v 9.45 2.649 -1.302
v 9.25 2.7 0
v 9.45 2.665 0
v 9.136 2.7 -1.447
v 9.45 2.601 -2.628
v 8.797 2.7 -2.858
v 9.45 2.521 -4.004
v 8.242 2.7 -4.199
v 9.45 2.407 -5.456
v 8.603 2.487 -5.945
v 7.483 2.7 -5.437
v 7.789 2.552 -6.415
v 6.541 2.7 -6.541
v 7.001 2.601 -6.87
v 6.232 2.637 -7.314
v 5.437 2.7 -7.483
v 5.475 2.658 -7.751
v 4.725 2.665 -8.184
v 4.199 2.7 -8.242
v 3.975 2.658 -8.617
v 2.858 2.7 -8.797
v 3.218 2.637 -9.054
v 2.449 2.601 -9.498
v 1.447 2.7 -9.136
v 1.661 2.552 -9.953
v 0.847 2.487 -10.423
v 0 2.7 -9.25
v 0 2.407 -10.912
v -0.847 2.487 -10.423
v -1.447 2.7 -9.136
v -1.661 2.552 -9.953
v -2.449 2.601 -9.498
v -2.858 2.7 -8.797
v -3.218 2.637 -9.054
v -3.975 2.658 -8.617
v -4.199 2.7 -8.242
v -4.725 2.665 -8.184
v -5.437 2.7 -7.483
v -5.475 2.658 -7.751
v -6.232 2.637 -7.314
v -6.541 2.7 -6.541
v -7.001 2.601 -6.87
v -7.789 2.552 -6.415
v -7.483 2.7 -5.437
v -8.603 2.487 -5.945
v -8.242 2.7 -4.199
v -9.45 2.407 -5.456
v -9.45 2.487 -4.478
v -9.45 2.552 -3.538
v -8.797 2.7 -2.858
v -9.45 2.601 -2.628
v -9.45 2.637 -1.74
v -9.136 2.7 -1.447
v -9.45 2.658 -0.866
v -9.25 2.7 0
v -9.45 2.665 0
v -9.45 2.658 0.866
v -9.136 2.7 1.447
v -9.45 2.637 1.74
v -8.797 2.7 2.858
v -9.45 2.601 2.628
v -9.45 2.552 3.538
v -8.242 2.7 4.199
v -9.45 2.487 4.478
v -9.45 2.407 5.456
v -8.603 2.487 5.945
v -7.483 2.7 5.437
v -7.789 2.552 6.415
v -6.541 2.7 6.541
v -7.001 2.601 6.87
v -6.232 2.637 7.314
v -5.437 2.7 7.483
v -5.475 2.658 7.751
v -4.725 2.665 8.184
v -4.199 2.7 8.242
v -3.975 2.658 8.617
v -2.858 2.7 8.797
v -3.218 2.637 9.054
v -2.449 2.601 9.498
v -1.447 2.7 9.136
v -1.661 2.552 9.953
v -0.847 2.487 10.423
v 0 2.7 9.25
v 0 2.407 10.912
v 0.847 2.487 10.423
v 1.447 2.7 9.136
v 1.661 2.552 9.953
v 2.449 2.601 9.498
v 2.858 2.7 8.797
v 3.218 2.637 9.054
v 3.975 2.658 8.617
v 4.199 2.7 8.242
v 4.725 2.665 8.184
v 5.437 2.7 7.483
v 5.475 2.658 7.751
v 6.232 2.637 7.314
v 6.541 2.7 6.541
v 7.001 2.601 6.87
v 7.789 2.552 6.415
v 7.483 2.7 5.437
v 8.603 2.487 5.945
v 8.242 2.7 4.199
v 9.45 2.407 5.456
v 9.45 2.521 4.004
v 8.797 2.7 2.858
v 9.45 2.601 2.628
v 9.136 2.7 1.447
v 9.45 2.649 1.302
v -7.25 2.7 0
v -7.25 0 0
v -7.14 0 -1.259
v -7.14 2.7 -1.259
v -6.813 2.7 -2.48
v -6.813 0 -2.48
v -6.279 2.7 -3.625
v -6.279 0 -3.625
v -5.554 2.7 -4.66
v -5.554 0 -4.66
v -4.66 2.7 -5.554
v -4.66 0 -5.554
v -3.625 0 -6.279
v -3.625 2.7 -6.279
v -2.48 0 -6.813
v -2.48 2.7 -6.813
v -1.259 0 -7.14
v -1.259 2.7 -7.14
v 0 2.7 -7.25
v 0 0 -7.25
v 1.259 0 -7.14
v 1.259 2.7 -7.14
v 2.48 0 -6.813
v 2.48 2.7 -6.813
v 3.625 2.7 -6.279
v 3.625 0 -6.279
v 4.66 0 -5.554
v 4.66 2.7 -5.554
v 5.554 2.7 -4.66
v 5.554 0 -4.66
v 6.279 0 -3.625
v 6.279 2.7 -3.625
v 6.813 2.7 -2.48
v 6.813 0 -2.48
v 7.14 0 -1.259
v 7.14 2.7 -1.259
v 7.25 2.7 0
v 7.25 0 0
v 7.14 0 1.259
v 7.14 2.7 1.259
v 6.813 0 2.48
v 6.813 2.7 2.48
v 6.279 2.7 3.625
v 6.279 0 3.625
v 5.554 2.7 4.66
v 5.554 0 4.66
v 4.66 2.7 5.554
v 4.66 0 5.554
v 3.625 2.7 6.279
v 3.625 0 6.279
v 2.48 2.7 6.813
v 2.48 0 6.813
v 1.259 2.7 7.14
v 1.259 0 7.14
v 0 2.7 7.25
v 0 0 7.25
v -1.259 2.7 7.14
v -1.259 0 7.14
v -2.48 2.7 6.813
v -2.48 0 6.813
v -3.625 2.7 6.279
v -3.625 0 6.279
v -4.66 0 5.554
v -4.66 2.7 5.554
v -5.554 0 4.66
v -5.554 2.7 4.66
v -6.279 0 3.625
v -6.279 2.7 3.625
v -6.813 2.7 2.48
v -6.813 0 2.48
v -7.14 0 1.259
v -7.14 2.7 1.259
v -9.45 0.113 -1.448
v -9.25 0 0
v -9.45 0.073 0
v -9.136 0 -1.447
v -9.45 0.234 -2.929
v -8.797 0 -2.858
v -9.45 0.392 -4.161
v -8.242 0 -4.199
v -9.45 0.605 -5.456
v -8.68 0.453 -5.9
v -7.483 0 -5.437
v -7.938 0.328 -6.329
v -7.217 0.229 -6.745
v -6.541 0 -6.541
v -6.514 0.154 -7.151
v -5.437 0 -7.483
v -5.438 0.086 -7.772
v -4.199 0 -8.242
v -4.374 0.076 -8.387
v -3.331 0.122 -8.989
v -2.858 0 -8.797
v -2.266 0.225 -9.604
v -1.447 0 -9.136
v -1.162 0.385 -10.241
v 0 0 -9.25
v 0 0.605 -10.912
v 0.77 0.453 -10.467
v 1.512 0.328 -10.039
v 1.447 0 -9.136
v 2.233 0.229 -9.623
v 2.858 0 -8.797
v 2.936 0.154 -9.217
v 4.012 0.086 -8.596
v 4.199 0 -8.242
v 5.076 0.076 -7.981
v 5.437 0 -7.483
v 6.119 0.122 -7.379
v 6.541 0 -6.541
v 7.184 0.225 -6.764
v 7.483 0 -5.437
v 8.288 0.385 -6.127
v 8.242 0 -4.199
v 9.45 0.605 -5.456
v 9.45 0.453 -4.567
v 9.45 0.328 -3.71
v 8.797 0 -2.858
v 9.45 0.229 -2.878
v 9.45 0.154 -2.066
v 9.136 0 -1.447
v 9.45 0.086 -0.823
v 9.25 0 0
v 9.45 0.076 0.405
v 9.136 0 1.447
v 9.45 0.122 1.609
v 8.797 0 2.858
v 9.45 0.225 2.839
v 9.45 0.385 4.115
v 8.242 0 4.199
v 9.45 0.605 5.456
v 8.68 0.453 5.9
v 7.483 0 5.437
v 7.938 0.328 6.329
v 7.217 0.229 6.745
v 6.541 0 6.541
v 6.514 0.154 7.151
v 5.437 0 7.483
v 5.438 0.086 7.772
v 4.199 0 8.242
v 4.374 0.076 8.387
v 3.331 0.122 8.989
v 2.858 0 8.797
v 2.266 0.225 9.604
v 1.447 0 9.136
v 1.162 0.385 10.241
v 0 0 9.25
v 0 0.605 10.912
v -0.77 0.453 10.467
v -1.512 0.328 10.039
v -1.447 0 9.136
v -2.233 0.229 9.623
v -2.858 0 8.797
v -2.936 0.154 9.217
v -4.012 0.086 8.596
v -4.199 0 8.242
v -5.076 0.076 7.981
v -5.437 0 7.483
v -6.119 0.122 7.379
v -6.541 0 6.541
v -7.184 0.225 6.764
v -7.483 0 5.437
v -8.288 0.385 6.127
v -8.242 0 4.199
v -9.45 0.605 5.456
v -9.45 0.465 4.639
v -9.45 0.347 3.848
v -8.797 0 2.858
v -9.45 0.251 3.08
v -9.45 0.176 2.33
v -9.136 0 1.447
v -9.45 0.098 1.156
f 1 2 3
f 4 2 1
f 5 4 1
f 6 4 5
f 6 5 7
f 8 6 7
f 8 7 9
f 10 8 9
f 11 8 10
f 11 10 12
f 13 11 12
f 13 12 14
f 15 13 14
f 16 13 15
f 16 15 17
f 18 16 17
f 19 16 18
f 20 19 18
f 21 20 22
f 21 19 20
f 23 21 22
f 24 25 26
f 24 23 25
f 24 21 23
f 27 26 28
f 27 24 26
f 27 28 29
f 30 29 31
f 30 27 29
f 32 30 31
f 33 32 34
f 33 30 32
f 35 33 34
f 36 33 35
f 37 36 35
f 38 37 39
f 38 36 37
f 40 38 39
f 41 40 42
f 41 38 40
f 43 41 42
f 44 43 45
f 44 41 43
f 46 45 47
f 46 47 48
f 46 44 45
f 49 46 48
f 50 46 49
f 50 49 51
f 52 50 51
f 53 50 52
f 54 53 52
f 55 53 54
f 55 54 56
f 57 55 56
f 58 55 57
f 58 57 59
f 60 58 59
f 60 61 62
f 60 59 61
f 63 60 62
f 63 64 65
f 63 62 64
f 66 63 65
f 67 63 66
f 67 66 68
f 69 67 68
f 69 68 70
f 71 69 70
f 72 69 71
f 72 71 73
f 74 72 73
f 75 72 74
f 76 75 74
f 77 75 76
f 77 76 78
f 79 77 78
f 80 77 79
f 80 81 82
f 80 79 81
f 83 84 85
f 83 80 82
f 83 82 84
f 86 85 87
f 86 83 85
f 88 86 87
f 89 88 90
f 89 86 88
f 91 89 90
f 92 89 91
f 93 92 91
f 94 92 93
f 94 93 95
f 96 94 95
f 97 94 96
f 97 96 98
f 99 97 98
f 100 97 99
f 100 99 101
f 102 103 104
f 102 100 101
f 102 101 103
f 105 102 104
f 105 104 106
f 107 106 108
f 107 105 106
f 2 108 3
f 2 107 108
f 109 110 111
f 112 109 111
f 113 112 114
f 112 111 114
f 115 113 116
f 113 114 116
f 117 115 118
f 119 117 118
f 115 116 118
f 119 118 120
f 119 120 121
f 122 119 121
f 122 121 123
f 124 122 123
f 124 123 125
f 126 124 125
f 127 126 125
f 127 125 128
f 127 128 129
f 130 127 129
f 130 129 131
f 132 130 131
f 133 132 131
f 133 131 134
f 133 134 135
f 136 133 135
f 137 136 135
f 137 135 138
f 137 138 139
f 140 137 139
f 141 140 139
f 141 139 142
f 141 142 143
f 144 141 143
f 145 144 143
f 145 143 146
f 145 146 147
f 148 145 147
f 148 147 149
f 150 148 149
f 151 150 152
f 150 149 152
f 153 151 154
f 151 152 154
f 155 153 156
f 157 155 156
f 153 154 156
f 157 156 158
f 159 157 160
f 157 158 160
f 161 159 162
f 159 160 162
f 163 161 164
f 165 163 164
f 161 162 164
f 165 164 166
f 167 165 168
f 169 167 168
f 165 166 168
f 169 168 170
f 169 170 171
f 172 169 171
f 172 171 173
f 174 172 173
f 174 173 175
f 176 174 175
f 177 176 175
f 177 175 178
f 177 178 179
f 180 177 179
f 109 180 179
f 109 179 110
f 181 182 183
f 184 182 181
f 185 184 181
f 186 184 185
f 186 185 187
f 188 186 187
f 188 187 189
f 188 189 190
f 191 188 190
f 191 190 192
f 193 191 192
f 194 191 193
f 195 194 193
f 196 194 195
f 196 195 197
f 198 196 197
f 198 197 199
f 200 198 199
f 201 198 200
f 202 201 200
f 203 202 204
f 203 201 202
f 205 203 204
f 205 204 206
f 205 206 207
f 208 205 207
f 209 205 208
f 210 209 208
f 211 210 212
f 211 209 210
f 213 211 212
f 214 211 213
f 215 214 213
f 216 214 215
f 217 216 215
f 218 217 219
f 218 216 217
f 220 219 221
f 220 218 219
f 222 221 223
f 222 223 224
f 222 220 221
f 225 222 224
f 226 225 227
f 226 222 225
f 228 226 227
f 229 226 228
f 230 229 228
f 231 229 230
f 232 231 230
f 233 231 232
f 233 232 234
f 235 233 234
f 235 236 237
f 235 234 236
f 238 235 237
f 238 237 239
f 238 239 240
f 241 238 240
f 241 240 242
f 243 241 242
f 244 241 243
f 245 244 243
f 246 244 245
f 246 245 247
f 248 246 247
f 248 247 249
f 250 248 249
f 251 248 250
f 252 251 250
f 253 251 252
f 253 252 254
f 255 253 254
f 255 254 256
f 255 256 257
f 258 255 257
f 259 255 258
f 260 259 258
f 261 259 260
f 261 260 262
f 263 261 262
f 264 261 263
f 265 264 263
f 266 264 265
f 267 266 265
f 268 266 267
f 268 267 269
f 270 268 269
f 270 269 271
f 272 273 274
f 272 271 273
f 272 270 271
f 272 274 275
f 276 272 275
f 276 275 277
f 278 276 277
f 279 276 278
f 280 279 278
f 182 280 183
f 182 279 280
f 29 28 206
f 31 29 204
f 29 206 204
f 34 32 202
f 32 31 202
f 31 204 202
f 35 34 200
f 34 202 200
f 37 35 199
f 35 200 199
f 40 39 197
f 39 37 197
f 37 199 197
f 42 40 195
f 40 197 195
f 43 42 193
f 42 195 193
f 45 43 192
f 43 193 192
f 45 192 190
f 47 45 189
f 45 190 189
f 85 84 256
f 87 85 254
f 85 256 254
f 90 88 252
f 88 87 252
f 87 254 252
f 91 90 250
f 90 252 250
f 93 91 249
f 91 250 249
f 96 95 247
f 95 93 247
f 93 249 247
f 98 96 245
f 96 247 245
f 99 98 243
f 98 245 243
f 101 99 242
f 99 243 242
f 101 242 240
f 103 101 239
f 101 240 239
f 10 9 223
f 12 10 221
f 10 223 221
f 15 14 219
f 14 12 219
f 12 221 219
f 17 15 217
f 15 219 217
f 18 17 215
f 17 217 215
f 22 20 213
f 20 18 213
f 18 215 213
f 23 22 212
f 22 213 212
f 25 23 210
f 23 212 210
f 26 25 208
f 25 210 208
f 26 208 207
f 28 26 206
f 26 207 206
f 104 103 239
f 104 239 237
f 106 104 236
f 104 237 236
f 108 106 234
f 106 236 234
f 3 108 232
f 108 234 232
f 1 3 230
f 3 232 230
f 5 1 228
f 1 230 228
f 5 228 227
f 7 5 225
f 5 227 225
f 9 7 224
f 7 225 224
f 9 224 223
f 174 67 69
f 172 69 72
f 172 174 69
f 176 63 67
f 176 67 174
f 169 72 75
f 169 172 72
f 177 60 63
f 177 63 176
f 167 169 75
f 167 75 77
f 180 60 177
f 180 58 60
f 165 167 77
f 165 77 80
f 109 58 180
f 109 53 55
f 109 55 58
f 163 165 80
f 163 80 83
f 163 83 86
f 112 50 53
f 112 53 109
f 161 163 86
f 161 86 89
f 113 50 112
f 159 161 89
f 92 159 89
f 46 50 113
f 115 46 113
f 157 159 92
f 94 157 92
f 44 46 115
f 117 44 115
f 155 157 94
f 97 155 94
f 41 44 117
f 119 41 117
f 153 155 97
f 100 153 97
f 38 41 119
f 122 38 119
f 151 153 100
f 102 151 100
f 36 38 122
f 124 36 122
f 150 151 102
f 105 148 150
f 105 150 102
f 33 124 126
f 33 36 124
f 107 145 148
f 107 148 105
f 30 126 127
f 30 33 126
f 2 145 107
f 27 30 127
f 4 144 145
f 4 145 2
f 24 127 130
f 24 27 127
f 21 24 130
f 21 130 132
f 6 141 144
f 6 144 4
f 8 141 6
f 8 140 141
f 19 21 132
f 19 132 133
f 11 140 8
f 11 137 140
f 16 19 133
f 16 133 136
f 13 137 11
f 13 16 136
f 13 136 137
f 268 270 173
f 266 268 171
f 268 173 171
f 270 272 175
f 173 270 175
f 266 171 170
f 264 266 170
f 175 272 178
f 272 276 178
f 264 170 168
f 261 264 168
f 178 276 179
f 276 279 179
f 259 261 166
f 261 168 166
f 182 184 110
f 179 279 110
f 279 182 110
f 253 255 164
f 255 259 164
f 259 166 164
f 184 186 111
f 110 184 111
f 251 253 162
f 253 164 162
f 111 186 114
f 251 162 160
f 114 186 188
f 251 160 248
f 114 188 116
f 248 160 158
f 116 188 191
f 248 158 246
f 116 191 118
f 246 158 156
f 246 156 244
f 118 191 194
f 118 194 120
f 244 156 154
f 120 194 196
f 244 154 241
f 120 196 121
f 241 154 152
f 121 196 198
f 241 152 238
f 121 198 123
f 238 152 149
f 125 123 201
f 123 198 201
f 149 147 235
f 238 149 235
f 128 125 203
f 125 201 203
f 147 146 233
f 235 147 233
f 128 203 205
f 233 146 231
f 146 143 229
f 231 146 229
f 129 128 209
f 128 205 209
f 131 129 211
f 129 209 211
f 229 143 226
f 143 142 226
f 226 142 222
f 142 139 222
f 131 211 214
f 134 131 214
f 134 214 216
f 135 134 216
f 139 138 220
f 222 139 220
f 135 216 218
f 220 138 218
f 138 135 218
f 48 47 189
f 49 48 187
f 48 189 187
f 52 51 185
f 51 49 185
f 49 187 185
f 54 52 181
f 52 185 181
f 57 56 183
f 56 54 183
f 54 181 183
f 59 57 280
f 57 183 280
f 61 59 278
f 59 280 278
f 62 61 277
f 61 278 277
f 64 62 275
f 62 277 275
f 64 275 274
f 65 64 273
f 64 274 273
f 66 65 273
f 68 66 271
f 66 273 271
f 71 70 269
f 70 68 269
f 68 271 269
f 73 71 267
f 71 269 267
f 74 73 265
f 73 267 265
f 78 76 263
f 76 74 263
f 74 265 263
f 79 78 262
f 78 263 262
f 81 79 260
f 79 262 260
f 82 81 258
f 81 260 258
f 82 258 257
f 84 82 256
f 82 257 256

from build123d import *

# Parameters (mm, degrees)
SALIENTE_EXTRUIR1_DEPTH        = 2.7
CROQUIS2_OUTSIDE_W             = 57.324
CROQUIS2_OUTSIDE_H             = 60.248
CROQUIS2_OUTSIDE_R             = 9.25
CORTAR_EXTRUIR1_DEPTH          = 2.7
CORTAR_EXTRUIR1_DRAFT          = -80
CROQUIS3_OUTSIDE_W             = 41.536
CROQUIS3_OUTSIDE_H             = 44.46
CROQUIS3_OUTSIDE_R             = 9.25
CORTAR_EXTRUIR2_DEPTH          = 2.7
CORTAR_EXTRUIR2_DRAFT          = -70
TALADRO_ROSCADO_M16X1_51_D     = 14.5
TALADRO_ROSCADO_M16X1_51_DEPTH = 39.5
TALADRO_ROSCADO_M16X1_51_TIP   = 4.356239488


with BuildPart() as part:
    # Croquis1 → Saliente-Extruir1 (new body)
    with BuildSketch(Plane(origin=(0, 0, 0), x_dir=(1, 0, 0), z_dir=(0, 1, 0))):
        Polygon((0, -10.911920088), (9.45, -5.455960044), (9.45, 5.455960044), (0, 10.911920088), (-9.45, 5.455960044), (-9.45, -5.455960044), align=None)
    extrude(amount=SALIENTE_EXTRUIR1_DEPTH)


with BuildPart() as cortar_extruir1_tool:
    # Croquis2 outside → Cortar-Extruir1 (with draft: the straight prism first)
    with BuildSketch(Plane(origin=(0, 2.7, 0), x_dir=(1, 0, 0), z_dir=(0, 1, 0))):
        Rectangle(CROQUIS2_OUTSIDE_W, CROQUIS2_OUTSIDE_H)
        Circle(CROQUIS2_OUTSIDE_R, mode=Mode.SUBTRACT)
    extrude(amount=-CORTAR_EXTRUIR1_DEPTH)
    # Cortar-Extruir1: the draft: its side faces are tilted about the plane it starts from
    cortar_extruir1_sides = [cortar_extruir1_tool.faces().sort_by_distance(p)[0] for p in [
        (0, 1.35, 30.124),
        (28.662, 1.35, 0),
        (0, 1.35, -30.124),
        (-28.662, 1.35, 0),
        (-9.25, 1.35, 0),
    ]]
    draft(cortar_extruir1_sides, Plane(origin=(0, 2.7, 0), x_dir=(1, 0, 0), z_dir=(0, 1, 0)), CORTAR_EXTRUIR1_DRAFT)


with BuildPart() as part_1:
    add(part.part)

    # Cortar-Extruir1: cut by cortar_extruir1_tool
    add(cortar_extruir1_tool.part, mode=Mode.SUBTRACT)


with BuildPart() as cortar_extruir2_tool:
    # Croquis3 outside → Cortar-Extruir2 (with draft: the straight prism first)
    with BuildSketch(Plane(origin=(0, 0, 0), x_dir=(-1, 0, 0), z_dir=(0, -1, 0))):
        Rectangle(CROQUIS3_OUTSIDE_W, CROQUIS3_OUTSIDE_H)
        Circle(CROQUIS3_OUTSIDE_R, mode=Mode.SUBTRACT)
    extrude(amount=-CORTAR_EXTRUIR2_DEPTH)
    # Cortar-Extruir2: the draft: its side faces are tilted about the plane it starts from
    cortar_extruir2_sides = [cortar_extruir2_tool.faces().sort_by_distance(p)[0] for p in [
        (0, 1.35, 22.23),
        (-20.768, 1.35, 0),
        (0, 1.35, -22.23),
        (20.768, 1.35, 0),
        (9.25, 1.35, 0),
    ]]
    draft(cortar_extruir2_sides, Plane(origin=(0, 0, 0), x_dir=(-1, 0, 0), z_dir=(0, -1, 0)), CORTAR_EXTRUIR2_DRAFT)


with BuildPart() as part_2:
    add(part_1.part)

    # Cortar-Extruir2: cut by cortar_extruir2_tool
    add(cortar_extruir2_tool.part, mode=Mode.SUBTRACT)

    # Taladro roscado M16x1.51
    with Locations(Plane(origin=(0, 2.7, 0), x_dir=(1, 0, 0), z_dir=(0, 1, 0))):
        with Locations((0, 0)):
            Hole(TALADRO_ROSCADO_M16X1_51_D / 2, depth=TALADRO_ROSCADO_M16X1_51_DEPTH)
            with Locations((0, 0, -(TALADRO_ROSCADO_M16X1_51_DEPTH + TALADRO_ROSCADO_M16X1_51_TIP / 2))):  # 118° drill point
                Cone(0, TALADRO_ROSCADO_M16X1_51_D / 2, TALADRO_ROSCADO_M16X1_51_TIP, mode=Mode.SUBTRACT)


solid = part_2.part
